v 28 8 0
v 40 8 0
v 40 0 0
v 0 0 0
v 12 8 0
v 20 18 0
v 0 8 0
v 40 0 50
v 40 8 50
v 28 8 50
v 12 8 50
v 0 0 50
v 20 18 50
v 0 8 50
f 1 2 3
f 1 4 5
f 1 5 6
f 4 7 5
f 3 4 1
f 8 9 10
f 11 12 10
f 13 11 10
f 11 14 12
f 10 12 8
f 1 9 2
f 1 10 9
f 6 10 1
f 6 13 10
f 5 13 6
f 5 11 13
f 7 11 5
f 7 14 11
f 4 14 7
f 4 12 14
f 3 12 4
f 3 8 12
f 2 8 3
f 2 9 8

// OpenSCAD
$fn = 32;

// ----------------------------------------------------------------------
// V guide rail: vrib, 40 mm wide
// ----------------------------------------------------------------------

// --- parameters (mm) ---
rail_w = 40;              // rail width, X
base_t = 8;               // base plate thickness
v_depth = 10;             // V feature depth / height
v_half_w = 8;             // half width of the V at the base face
plate_t = 50;             // rail length, Z (the extrusion height)

profile = [[0, 0], [40, 0], [40, 8], [28, 8], [20, 18], [12, 8], [0, 8]];  // primary outline, 7 points, counter clockwise

// --- the one profile operation ---
linear_extrude(height = plate_t) polygon(points = profile);
